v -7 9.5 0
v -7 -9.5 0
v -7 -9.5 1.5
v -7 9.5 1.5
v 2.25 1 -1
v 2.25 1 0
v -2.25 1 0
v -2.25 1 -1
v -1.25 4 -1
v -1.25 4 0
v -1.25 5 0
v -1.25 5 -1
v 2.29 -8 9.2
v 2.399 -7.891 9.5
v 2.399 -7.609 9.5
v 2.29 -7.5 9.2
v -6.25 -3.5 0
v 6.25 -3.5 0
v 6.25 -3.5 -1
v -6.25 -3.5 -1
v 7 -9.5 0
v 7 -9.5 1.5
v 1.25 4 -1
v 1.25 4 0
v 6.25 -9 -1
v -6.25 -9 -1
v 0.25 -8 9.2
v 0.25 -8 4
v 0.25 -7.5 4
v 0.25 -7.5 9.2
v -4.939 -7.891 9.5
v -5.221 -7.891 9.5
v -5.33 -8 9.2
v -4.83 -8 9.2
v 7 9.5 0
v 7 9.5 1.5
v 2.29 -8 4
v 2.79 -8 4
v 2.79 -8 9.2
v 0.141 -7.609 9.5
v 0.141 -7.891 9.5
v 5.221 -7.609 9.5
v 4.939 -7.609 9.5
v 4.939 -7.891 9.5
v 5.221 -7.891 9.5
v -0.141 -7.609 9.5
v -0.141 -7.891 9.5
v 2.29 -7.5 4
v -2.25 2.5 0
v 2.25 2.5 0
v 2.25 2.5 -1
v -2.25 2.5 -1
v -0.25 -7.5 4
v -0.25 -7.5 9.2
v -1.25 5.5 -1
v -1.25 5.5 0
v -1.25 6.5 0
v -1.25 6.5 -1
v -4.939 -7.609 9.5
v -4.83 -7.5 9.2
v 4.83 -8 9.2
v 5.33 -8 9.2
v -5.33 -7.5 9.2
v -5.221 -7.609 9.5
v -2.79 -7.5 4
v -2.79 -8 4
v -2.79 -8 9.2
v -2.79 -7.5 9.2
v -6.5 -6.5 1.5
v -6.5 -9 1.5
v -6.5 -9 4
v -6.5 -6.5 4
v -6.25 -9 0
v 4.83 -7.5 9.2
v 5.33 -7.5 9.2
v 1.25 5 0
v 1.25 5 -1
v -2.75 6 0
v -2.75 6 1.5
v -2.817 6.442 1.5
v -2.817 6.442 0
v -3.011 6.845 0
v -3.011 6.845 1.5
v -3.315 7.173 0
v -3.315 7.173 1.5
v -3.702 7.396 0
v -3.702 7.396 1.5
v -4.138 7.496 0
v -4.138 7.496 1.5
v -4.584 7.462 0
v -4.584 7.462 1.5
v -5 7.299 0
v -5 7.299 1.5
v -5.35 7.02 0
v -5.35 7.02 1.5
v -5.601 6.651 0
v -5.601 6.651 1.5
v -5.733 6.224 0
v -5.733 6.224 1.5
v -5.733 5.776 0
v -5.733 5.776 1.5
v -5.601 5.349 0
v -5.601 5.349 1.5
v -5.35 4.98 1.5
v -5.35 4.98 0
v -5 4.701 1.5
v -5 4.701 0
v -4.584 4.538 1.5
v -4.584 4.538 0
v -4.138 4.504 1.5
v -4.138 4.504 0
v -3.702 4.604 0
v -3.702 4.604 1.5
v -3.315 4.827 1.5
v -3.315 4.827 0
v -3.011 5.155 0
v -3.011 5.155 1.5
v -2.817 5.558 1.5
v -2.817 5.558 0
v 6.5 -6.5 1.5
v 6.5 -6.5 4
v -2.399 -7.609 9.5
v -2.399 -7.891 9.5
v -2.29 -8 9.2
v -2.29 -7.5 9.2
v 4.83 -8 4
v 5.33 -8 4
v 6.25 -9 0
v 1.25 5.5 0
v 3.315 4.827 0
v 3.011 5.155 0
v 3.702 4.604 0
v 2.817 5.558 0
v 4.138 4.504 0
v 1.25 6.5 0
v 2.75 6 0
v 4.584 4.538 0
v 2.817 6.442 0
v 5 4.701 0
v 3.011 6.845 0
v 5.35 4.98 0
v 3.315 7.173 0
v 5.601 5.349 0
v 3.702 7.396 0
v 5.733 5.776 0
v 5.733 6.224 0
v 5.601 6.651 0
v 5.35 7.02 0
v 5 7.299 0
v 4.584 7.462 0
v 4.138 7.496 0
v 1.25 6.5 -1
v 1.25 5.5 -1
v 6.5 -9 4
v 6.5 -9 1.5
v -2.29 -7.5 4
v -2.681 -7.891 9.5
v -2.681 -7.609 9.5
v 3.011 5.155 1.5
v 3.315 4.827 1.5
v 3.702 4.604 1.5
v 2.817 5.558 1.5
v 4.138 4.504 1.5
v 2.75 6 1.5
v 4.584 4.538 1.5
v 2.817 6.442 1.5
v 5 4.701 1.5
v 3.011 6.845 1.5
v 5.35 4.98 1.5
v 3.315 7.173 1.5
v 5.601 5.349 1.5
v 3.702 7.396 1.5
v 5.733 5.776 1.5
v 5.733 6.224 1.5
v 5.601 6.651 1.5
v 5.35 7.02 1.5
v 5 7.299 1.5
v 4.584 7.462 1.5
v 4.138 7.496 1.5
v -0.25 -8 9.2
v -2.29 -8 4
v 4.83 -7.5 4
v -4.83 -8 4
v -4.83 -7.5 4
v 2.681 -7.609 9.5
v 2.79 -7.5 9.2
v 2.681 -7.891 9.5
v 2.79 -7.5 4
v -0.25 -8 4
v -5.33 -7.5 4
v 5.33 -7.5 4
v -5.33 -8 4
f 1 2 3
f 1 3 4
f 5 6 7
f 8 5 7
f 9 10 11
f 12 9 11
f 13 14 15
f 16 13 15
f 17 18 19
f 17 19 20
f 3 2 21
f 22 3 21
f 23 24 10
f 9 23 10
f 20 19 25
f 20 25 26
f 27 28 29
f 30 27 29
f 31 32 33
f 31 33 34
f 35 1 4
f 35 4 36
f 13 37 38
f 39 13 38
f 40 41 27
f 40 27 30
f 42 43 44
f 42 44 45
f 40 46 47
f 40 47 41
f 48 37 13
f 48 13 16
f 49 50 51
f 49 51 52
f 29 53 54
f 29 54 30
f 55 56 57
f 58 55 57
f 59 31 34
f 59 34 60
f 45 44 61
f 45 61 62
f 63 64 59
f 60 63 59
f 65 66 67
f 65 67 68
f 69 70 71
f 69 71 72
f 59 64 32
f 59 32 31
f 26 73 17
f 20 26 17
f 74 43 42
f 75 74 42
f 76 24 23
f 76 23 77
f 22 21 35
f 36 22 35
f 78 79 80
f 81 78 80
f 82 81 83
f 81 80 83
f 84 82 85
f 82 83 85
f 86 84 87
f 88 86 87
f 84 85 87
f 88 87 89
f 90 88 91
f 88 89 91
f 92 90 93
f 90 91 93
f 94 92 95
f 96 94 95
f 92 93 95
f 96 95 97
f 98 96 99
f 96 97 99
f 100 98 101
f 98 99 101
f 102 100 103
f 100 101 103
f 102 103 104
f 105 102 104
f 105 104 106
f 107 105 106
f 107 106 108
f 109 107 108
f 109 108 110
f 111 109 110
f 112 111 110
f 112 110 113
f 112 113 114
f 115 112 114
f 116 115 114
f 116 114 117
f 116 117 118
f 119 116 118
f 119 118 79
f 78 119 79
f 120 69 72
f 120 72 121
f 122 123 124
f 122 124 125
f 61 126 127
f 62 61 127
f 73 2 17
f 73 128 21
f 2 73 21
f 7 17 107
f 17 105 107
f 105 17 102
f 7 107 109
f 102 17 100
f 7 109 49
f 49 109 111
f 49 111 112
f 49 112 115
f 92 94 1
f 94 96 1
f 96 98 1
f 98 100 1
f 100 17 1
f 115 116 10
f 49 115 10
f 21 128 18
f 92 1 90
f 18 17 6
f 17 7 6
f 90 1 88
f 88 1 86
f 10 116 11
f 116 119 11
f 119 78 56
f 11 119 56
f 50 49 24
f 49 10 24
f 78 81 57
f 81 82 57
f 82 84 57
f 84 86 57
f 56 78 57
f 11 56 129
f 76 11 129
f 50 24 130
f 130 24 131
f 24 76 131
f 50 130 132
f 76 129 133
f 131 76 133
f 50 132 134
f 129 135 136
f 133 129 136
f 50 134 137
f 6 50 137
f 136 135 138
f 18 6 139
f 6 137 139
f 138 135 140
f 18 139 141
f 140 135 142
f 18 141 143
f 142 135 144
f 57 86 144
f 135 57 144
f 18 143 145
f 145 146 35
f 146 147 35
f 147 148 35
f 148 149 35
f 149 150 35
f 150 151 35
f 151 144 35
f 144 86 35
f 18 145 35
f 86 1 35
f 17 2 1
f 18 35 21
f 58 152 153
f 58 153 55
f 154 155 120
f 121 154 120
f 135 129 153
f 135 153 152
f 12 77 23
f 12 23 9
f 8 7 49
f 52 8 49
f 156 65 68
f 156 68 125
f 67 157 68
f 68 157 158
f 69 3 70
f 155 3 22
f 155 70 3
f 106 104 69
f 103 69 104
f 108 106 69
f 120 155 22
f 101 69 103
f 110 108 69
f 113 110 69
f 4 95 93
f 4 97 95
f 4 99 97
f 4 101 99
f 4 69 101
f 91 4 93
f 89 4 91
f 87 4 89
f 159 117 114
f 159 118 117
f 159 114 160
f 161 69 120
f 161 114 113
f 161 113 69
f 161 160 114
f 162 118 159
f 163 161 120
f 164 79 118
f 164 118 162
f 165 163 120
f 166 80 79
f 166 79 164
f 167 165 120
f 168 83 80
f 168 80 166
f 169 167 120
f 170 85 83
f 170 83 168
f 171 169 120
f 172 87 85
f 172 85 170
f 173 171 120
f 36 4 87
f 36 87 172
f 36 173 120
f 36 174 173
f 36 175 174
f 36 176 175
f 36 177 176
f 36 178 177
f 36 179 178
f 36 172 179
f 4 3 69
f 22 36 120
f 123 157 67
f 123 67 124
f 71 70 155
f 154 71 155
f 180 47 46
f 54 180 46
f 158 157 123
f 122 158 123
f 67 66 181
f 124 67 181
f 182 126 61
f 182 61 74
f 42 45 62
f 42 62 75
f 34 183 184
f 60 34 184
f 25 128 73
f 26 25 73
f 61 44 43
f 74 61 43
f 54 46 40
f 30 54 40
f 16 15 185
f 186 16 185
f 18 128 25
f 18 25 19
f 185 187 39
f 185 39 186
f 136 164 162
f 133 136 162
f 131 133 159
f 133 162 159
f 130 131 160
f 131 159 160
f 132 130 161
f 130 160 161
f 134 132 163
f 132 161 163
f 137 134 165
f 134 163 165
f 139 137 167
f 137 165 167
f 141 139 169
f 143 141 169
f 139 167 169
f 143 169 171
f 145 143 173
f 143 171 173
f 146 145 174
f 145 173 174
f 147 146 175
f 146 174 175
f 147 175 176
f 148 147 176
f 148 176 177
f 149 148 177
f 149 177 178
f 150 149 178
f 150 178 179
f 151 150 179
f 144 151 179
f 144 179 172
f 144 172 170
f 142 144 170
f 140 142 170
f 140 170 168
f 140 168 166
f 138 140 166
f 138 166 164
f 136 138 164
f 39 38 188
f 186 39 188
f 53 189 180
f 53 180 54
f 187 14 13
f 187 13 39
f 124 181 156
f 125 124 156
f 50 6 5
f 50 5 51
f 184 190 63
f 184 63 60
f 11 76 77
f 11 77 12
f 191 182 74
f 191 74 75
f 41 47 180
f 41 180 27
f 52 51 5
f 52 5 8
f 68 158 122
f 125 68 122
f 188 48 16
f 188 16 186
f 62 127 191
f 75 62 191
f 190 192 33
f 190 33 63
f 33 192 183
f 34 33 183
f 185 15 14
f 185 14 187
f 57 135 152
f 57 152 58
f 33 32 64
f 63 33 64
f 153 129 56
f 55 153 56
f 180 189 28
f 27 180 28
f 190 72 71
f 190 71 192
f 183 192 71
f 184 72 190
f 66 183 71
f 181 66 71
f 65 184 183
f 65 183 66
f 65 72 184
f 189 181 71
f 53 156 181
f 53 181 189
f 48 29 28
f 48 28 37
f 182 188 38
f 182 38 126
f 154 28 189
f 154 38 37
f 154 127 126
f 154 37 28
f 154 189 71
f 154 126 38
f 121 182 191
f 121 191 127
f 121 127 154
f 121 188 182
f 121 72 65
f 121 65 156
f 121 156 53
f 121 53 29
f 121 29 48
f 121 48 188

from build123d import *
from OCP.BRepFilletAPI import BRepFilletAPI_MakeChamfer

# Parameters (mm, degrees)
SKETCH2_W                     = 14
SKETCH2_H                     = 19
BOSS_EXTRUDE1_DEPTH           = 1.5
SKETCH3_R                     = 1.5
CUT_EXTRUDE1_DEPTH            = 12.895377253
SKETCH4_W                     = 13
SKETCH4_H                     = 2.5
BOSS_EXTRUDE2_DEPTH           = 2.5
SKETCH5_W                     = 0.5
SKETCH5_H                     = 0.5
BOSS_EXTRUDE3_DEPTH           = 5.5
CHAMFER1_SIZE                 = 0.3
CHAMFER1_SIZE2                = 0.10919107
SKETCH6_W                     = 12.5
SKETCH6_H                     = 5.5
SKETCH6_W_2                   = 4.5
SKETCH6_H_2                   = 1.5
SKETCH6_W_3                   = 2.5
SKETCH6_H_3                   = 1
KOPONENTTIEN_TILAVARAUS_DEPTH = 1


with BuildPart() as part:
    # Sketch2 → Boss-Extrude1 (new body)
    with BuildSketch(Plane.XY):
        Rectangle(SKETCH2_W, SKETCH2_H)
    extrude(amount=BOSS_EXTRUDE1_DEPTH)

    # Sketch3 → Cut-Extrude1 (cut, through all)
    with BuildSketch(Plane.XY.offset(1.5)):
        with Locations((-4.25, 6)):
            Circle(SKETCH3_R)
        with Locations(Location((4.25, 6, 0), (0, 0, 180))):
            Circle(SKETCH3_R)
    extrude(amount=-CUT_EXTRUDE1_DEPTH, mode=Mode.SUBTRACT)

    # Sketch4 → Boss-Extrude2 (add)
    with BuildSketch(Plane.XY.offset(1.5)):
        with Locations((0, -7.75)):
            Rectangle(SKETCH4_W, SKETCH4_H)
    extrude(amount=BOSS_EXTRUDE2_DEPTH)

    # Sketch5 → Boss-Extrude3 (add)
    with BuildSketch(Plane.XY.offset(4)):
        with Locations((-5.08, -7.75)):
            Rectangle(SKETCH5_W, SKETCH5_H)
        with Locations((-2.54, -7.75)):
            Rectangle(SKETCH5_W, SKETCH5_H)
        with Locations((0, -7.75)):
            Rectangle(SKETCH5_W, SKETCH5_H)
        with Locations((2.54, -7.75)):
            Rectangle(SKETCH5_W, SKETCH5_H)
        with Locations((5.08, -7.75)):
            Rectangle(SKETCH5_W, SKETCH5_H)
    extrude(amount=BOSS_EXTRUDE3_DEPTH)

    # Chamfer1: one chamfer whose edges measure the first distance from different faces: ONE call of the kernel's chamfer builder (chamfer() names one face for all edges)
    chamfer1_edges_1 = [part.edges().sort_by_distance(p)[0] for p in [
        (-4.83, -7.75, 9.5),
    ]]
    chamfer1_side_1 = [part.faces().sort_by_distance(p)[0] for p in [
        (-4.83, -7.75, 6.75),
    ]]
    chamfer1_edges_2 = [part.edges().sort_by_distance(p)[0] for p in [
        (-5.08, -7.5, 9.5),
    ]]
    chamfer1_side_2 = [part.faces().sort_by_distance(p)[0] for p in [
        (-5.08, -7.5, 6.75),
    ]]
    chamfer1_edges_3 = [part.edges().sort_by_distance(p)[0] for p in [
        (-5.33, -7.75, 9.5),
    ]]
    chamfer1_side_3 = [part.faces().sort_by_distance(p)[0] for p in [
        (-5.33, -7.75, 6.75),
    ]]
    chamfer1_edges_4 = [part.edges().sort_by_distance(p)[0] for p in [
        (-5.08, -8, 9.5),
    ]]
    chamfer1_side_4 = [part.faces().sort_by_distance(p)[0] for p in [
        (-5.08, -8, 6.75),
    ]]
    chamfer1_edges_5 = [part.edges().sort_by_distance(p)[0] for p in [
        (-2.29, -7.75, 9.5),
    ]]
    chamfer1_side_5 = [part.faces().sort_by_distance(p)[0] for p in [
        (-2.29, -7.75, 6.75),
    ]]
    chamfer1_edges_6 = [part.edges().sort_by_distance(p)[0] for p in [
        (-2.54, -7.5, 9.5),
    ]]
    chamfer1_side_6 = [part.faces().sort_by_distance(p)[0] for p in [
        (-2.54, -7.5, 6.75),
    ]]
    chamfer1_edges_7 = [part.edges().sort_by_distance(p)[0] for p in [
        (-2.79, -7.75, 9.5),
    ]]
    chamfer1_side_7 = [part.faces().sort_by_distance(p)[0] for p in [
        (-2.79, -7.75, 6.75),
    ]]
    chamfer1_edges_8 = [part.edges().sort_by_distance(p)[0] for p in [
        (-2.54, -8, 9.5),
    ]]
    chamfer1_side_8 = [part.faces().sort_by_distance(p)[0] for p in [
        (-2.54, -8, 6.75),
    ]]
    chamfer1_edges_9 = [part.edges().sort_by_distance(p)[0] for p in [
        (0.25, -7.75, 9.5),
    ]]
    chamfer1_side_9 = [part.faces().sort_by_distance(p)[0] for p in [
        (0.25, -7.75, 6.75),
    ]]
    chamfer1_edges_10 = [part.edges().sort_by_distance(p)[0] for p in [
        (0, -7.5, 9.5),
    ]]
    chamfer1_side_10 = [part.faces().sort_by_distance(p)[0] for p in [
        (0, -7.5, 6.75),
    ]]
    chamfer1_edges_11 = [part.edges().sort_by_distance(p)[0] for p in [
        (-0.25, -7.75, 9.5),
    ]]
    chamfer1_side_11 = [part.faces().sort_by_distance(p)[0] for p in [
        (-0.25, -7.75, 6.75),
    ]]
    chamfer1_edges_12 = [part.edges().sort_by_distance(p)[0] for p in [
        (0, -8, 9.5),
    ]]
    chamfer1_side_12 = [part.faces().sort_by_distance(p)[0] for p in [
        (0, -8, 6.75),
    ]]
    chamfer1_edges_13 = [part.edges().sort_by_distance(p)[0] for p in [
        (2.79, -7.75, 9.5),
    ]]
    chamfer1_side_13 = [part.faces().sort_by_distance(p)[0] for p in [
        (2.79, -7.75, 6.75),
    ]]
    chamfer1_edges_14 = [part.edges().sort_by_distance(p)[0] for p in [
        (2.54, -7.5, 9.5),
    ]]
    chamfer1_side_14 = [part.faces().sort_by_distance(p)[0] for p in [
        (2.54, -7.5, 6.75),
    ]]
    chamfer1_edges_15 = [part.edges().sort_by_distance(p)[0] for p in [
        (2.29, -7.75, 9.5),
    ]]
    chamfer1_side_15 = [part.faces().sort_by_distance(p)[0] for p in [
        (2.29, -7.75, 6.75),
    ]]
    chamfer1_edges_16 = [part.edges().sort_by_distance(p)[0] for p in [
        (2.54, -8, 9.5),
    ]]
    chamfer1_side_16 = [part.faces().sort_by_distance(p)[0] for p in [
        (2.54, -8, 6.75),
    ]]
    chamfer1_edges_17 = [part.edges().sort_by_distance(p)[0] for p in [
        (5.33, -7.75, 9.5),
    ]]
    chamfer1_side_17 = [part.faces().sort_by_distance(p)[0] for p in [
        (5.33, -7.75, 6.75),
    ]]
    chamfer1_edges_18 = [part.edges().sort_by_distance(p)[0] for p in [
        (5.08, -7.5, 9.5),
    ]]
    chamfer1_side_18 = [part.faces().sort_by_distance(p)[0] for p in [
        (5.08, -7.5, 6.75),
    ]]
    chamfer1_edges_19 = [part.edges().sort_by_distance(p)[0] for p in [
        (4.83, -7.75, 9.5),
    ]]
    chamfer1_side_19 = [part.faces().sort_by_distance(p)[0] for p in [
        (4.83, -7.75, 6.75),
    ]]
    chamfer1_edges_20 = [part.edges().sort_by_distance(p)[0] for p in [
        (5.08, -8, 9.5),
    ]]
    chamfer1_side_20 = [part.faces().sort_by_distance(p)[0] for p in [
        (5.08, -8, 6.75),
    ]]
    chamfer1 = BRepFilletAPI_MakeChamfer(part.part.solid().wrapped)
    for e in chamfer1_edges_1:
        chamfer1.Add(CHAMFER1_SIZE, CHAMFER1_SIZE2, e.wrapped, chamfer1_side_1[0].wrapped)  # the first distance lies on this face
    for e in chamfer1_edges_2:
        chamfer1.Add(CHAMFER1_SIZE, CHAMFER1_SIZE2, e.wrapped, chamfer1_side_2[0].wrapped)  # the first distance lies on this face
    for e in chamfer1_edges_3:
        chamfer1.Add(CHAMFER1_SIZE, CHAMFER1_SIZE2, e.wrapped, chamfer1_side_3[0].wrapped)  # the first distance lies on this face
    for e in chamfer1_edges_4:
        chamfer1.Add(CHAMFER1_SIZE, CHAMFER1_SIZE2, e.wrapped, chamfer1_side_4[0].wrapped)  # the first distance lies on this face
    for e in chamfer1_edges_5:
        chamfer1.Add(CHAMFER1_SIZE, CHAMFER1_SIZE2, e.wrapped, chamfer1_side_5[0].wrapped)  # the first distance lies on this face
    for e in chamfer1_edges_6:
        chamfer1.Add(CHAMFER1_SIZE, CHAMFER1_SIZE2, e.wrapped, chamfer1_side_6[0].wrapped)  # the first distance lies on this face
    for e in chamfer1_edges_7:
        chamfer1.Add(CHAMFER1_SIZE, CHAMFER1_SIZE2, e.wrapped, chamfer1_side_7[0].wrapped)  # the first distance lies on this face
    for e in chamfer1_edges_8:
        chamfer1.Add(CHAMFER1_SIZE, CHAMFER1_SIZE2, e.wrapped, chamfer1_side_8[0].wrapped)  # the first distance lies on this face
    for e in chamfer1_edges_9:
        chamfer1.Add(CHAMFER1_SIZE, CHAMFER1_SIZE2, e.wrapped, chamfer1_side_9[0].wrapped)  # the first distance lies on this face
    for e in chamfer1_edges_10:
        chamfer1.Add(CHAMFER1_SIZE, CHAMFER1_SIZE2, e.wrapped, chamfer1_side_10[0].wrapped)  # the first distance lies on this face
    for e in chamfer1_edges_11:
        chamfer1.Add(CHAMFER1_SIZE, CHAMFER1_SIZE2, e.wrapped, chamfer1_side_11[0].wrapped)  # the first distance lies on this face
    for e in chamfer1_edges_12:
        chamfer1.Add(CHAMFER1_SIZE, CHAMFER1_SIZE2, e.wrapped, chamfer1_side_12[0].wrapped)  # the first distance lies on this face
    for e in chamfer1_edges_13:
        chamfer1.Add(CHAMFER1_SIZE, CHAMFER1_SIZE2, e.wrapped, chamfer1_side_13[0].wrapped)  # the first distance lies on this face
    for e in chamfer1_edges_14:
        chamfer1.Add(CHAMFER1_SIZE, CHAMFER1_SIZE2, e.wrapped, chamfer1_side_14[0].wrapped)  # the first distance lies on this face
    for e in chamfer1_edges_15:
        chamfer1.Add(CHAMFER1_SIZE, CHAMFER1_SIZE2, e.wrapped, chamfer1_side_15[0].wrapped)  # the first distance lies on this face
    for e in chamfer1_edges_16:
        chamfer1.Add(CHAMFER1_SIZE, CHAMFER1_SIZE2, e.wrapped, chamfer1_side_16[0].wrapped)  # the first distance lies on this face
    for e in chamfer1_edges_17:
        chamfer1.Add(CHAMFER1_SIZE, CHAMFER1_SIZE2, e.wrapped, chamfer1_side_17[0].wrapped)  # the first distance lies on this face
    for e in chamfer1_edges_18:
        chamfer1.Add(CHAMFER1_SIZE, CHAMFER1_SIZE2, e.wrapped, chamfer1_side_18[0].wrapped)  # the first distance lies on this face
    for e in chamfer1_edges_19:
        chamfer1.Add(CHAMFER1_SIZE, CHAMFER1_SIZE2, e.wrapped, chamfer1_side_19[0].wrapped)  # the first distance lies on this face
    for e in chamfer1_edges_20:
        chamfer1.Add(CHAMFER1_SIZE, CHAMFER1_SIZE2, e.wrapped, chamfer1_side_20[0].wrapped)  # the first distance lies on this face
    add(Compound.cast(chamfer1.Shape()), mode=Mode.REPLACE)

    # Sketch6 → Koponenttien tilavaraus (add)
    with BuildSketch(Plane(origin=(0, 0, 0), x_dir=(-1, 0, 0), z_dir=(0, 0, -1))):
        with Locations((0, -6.25)):
            Rectangle(SKETCH6_W, SKETCH6_H)
        with Locations((0, 1.75)):
            Rectangle(SKETCH6_W_2, SKETCH6_H_2)
        with Locations((0, 6)):
            Rectangle(SKETCH6_W_3, SKETCH6_H_3)
        with Locations((0, 4.5)):
            Rectangle(SKETCH6_W_3, SKETCH6_H_3)
    extrude(amount=KOPONENTTIEN_TILAVARAUS_DEPTH)


solid = part.part
